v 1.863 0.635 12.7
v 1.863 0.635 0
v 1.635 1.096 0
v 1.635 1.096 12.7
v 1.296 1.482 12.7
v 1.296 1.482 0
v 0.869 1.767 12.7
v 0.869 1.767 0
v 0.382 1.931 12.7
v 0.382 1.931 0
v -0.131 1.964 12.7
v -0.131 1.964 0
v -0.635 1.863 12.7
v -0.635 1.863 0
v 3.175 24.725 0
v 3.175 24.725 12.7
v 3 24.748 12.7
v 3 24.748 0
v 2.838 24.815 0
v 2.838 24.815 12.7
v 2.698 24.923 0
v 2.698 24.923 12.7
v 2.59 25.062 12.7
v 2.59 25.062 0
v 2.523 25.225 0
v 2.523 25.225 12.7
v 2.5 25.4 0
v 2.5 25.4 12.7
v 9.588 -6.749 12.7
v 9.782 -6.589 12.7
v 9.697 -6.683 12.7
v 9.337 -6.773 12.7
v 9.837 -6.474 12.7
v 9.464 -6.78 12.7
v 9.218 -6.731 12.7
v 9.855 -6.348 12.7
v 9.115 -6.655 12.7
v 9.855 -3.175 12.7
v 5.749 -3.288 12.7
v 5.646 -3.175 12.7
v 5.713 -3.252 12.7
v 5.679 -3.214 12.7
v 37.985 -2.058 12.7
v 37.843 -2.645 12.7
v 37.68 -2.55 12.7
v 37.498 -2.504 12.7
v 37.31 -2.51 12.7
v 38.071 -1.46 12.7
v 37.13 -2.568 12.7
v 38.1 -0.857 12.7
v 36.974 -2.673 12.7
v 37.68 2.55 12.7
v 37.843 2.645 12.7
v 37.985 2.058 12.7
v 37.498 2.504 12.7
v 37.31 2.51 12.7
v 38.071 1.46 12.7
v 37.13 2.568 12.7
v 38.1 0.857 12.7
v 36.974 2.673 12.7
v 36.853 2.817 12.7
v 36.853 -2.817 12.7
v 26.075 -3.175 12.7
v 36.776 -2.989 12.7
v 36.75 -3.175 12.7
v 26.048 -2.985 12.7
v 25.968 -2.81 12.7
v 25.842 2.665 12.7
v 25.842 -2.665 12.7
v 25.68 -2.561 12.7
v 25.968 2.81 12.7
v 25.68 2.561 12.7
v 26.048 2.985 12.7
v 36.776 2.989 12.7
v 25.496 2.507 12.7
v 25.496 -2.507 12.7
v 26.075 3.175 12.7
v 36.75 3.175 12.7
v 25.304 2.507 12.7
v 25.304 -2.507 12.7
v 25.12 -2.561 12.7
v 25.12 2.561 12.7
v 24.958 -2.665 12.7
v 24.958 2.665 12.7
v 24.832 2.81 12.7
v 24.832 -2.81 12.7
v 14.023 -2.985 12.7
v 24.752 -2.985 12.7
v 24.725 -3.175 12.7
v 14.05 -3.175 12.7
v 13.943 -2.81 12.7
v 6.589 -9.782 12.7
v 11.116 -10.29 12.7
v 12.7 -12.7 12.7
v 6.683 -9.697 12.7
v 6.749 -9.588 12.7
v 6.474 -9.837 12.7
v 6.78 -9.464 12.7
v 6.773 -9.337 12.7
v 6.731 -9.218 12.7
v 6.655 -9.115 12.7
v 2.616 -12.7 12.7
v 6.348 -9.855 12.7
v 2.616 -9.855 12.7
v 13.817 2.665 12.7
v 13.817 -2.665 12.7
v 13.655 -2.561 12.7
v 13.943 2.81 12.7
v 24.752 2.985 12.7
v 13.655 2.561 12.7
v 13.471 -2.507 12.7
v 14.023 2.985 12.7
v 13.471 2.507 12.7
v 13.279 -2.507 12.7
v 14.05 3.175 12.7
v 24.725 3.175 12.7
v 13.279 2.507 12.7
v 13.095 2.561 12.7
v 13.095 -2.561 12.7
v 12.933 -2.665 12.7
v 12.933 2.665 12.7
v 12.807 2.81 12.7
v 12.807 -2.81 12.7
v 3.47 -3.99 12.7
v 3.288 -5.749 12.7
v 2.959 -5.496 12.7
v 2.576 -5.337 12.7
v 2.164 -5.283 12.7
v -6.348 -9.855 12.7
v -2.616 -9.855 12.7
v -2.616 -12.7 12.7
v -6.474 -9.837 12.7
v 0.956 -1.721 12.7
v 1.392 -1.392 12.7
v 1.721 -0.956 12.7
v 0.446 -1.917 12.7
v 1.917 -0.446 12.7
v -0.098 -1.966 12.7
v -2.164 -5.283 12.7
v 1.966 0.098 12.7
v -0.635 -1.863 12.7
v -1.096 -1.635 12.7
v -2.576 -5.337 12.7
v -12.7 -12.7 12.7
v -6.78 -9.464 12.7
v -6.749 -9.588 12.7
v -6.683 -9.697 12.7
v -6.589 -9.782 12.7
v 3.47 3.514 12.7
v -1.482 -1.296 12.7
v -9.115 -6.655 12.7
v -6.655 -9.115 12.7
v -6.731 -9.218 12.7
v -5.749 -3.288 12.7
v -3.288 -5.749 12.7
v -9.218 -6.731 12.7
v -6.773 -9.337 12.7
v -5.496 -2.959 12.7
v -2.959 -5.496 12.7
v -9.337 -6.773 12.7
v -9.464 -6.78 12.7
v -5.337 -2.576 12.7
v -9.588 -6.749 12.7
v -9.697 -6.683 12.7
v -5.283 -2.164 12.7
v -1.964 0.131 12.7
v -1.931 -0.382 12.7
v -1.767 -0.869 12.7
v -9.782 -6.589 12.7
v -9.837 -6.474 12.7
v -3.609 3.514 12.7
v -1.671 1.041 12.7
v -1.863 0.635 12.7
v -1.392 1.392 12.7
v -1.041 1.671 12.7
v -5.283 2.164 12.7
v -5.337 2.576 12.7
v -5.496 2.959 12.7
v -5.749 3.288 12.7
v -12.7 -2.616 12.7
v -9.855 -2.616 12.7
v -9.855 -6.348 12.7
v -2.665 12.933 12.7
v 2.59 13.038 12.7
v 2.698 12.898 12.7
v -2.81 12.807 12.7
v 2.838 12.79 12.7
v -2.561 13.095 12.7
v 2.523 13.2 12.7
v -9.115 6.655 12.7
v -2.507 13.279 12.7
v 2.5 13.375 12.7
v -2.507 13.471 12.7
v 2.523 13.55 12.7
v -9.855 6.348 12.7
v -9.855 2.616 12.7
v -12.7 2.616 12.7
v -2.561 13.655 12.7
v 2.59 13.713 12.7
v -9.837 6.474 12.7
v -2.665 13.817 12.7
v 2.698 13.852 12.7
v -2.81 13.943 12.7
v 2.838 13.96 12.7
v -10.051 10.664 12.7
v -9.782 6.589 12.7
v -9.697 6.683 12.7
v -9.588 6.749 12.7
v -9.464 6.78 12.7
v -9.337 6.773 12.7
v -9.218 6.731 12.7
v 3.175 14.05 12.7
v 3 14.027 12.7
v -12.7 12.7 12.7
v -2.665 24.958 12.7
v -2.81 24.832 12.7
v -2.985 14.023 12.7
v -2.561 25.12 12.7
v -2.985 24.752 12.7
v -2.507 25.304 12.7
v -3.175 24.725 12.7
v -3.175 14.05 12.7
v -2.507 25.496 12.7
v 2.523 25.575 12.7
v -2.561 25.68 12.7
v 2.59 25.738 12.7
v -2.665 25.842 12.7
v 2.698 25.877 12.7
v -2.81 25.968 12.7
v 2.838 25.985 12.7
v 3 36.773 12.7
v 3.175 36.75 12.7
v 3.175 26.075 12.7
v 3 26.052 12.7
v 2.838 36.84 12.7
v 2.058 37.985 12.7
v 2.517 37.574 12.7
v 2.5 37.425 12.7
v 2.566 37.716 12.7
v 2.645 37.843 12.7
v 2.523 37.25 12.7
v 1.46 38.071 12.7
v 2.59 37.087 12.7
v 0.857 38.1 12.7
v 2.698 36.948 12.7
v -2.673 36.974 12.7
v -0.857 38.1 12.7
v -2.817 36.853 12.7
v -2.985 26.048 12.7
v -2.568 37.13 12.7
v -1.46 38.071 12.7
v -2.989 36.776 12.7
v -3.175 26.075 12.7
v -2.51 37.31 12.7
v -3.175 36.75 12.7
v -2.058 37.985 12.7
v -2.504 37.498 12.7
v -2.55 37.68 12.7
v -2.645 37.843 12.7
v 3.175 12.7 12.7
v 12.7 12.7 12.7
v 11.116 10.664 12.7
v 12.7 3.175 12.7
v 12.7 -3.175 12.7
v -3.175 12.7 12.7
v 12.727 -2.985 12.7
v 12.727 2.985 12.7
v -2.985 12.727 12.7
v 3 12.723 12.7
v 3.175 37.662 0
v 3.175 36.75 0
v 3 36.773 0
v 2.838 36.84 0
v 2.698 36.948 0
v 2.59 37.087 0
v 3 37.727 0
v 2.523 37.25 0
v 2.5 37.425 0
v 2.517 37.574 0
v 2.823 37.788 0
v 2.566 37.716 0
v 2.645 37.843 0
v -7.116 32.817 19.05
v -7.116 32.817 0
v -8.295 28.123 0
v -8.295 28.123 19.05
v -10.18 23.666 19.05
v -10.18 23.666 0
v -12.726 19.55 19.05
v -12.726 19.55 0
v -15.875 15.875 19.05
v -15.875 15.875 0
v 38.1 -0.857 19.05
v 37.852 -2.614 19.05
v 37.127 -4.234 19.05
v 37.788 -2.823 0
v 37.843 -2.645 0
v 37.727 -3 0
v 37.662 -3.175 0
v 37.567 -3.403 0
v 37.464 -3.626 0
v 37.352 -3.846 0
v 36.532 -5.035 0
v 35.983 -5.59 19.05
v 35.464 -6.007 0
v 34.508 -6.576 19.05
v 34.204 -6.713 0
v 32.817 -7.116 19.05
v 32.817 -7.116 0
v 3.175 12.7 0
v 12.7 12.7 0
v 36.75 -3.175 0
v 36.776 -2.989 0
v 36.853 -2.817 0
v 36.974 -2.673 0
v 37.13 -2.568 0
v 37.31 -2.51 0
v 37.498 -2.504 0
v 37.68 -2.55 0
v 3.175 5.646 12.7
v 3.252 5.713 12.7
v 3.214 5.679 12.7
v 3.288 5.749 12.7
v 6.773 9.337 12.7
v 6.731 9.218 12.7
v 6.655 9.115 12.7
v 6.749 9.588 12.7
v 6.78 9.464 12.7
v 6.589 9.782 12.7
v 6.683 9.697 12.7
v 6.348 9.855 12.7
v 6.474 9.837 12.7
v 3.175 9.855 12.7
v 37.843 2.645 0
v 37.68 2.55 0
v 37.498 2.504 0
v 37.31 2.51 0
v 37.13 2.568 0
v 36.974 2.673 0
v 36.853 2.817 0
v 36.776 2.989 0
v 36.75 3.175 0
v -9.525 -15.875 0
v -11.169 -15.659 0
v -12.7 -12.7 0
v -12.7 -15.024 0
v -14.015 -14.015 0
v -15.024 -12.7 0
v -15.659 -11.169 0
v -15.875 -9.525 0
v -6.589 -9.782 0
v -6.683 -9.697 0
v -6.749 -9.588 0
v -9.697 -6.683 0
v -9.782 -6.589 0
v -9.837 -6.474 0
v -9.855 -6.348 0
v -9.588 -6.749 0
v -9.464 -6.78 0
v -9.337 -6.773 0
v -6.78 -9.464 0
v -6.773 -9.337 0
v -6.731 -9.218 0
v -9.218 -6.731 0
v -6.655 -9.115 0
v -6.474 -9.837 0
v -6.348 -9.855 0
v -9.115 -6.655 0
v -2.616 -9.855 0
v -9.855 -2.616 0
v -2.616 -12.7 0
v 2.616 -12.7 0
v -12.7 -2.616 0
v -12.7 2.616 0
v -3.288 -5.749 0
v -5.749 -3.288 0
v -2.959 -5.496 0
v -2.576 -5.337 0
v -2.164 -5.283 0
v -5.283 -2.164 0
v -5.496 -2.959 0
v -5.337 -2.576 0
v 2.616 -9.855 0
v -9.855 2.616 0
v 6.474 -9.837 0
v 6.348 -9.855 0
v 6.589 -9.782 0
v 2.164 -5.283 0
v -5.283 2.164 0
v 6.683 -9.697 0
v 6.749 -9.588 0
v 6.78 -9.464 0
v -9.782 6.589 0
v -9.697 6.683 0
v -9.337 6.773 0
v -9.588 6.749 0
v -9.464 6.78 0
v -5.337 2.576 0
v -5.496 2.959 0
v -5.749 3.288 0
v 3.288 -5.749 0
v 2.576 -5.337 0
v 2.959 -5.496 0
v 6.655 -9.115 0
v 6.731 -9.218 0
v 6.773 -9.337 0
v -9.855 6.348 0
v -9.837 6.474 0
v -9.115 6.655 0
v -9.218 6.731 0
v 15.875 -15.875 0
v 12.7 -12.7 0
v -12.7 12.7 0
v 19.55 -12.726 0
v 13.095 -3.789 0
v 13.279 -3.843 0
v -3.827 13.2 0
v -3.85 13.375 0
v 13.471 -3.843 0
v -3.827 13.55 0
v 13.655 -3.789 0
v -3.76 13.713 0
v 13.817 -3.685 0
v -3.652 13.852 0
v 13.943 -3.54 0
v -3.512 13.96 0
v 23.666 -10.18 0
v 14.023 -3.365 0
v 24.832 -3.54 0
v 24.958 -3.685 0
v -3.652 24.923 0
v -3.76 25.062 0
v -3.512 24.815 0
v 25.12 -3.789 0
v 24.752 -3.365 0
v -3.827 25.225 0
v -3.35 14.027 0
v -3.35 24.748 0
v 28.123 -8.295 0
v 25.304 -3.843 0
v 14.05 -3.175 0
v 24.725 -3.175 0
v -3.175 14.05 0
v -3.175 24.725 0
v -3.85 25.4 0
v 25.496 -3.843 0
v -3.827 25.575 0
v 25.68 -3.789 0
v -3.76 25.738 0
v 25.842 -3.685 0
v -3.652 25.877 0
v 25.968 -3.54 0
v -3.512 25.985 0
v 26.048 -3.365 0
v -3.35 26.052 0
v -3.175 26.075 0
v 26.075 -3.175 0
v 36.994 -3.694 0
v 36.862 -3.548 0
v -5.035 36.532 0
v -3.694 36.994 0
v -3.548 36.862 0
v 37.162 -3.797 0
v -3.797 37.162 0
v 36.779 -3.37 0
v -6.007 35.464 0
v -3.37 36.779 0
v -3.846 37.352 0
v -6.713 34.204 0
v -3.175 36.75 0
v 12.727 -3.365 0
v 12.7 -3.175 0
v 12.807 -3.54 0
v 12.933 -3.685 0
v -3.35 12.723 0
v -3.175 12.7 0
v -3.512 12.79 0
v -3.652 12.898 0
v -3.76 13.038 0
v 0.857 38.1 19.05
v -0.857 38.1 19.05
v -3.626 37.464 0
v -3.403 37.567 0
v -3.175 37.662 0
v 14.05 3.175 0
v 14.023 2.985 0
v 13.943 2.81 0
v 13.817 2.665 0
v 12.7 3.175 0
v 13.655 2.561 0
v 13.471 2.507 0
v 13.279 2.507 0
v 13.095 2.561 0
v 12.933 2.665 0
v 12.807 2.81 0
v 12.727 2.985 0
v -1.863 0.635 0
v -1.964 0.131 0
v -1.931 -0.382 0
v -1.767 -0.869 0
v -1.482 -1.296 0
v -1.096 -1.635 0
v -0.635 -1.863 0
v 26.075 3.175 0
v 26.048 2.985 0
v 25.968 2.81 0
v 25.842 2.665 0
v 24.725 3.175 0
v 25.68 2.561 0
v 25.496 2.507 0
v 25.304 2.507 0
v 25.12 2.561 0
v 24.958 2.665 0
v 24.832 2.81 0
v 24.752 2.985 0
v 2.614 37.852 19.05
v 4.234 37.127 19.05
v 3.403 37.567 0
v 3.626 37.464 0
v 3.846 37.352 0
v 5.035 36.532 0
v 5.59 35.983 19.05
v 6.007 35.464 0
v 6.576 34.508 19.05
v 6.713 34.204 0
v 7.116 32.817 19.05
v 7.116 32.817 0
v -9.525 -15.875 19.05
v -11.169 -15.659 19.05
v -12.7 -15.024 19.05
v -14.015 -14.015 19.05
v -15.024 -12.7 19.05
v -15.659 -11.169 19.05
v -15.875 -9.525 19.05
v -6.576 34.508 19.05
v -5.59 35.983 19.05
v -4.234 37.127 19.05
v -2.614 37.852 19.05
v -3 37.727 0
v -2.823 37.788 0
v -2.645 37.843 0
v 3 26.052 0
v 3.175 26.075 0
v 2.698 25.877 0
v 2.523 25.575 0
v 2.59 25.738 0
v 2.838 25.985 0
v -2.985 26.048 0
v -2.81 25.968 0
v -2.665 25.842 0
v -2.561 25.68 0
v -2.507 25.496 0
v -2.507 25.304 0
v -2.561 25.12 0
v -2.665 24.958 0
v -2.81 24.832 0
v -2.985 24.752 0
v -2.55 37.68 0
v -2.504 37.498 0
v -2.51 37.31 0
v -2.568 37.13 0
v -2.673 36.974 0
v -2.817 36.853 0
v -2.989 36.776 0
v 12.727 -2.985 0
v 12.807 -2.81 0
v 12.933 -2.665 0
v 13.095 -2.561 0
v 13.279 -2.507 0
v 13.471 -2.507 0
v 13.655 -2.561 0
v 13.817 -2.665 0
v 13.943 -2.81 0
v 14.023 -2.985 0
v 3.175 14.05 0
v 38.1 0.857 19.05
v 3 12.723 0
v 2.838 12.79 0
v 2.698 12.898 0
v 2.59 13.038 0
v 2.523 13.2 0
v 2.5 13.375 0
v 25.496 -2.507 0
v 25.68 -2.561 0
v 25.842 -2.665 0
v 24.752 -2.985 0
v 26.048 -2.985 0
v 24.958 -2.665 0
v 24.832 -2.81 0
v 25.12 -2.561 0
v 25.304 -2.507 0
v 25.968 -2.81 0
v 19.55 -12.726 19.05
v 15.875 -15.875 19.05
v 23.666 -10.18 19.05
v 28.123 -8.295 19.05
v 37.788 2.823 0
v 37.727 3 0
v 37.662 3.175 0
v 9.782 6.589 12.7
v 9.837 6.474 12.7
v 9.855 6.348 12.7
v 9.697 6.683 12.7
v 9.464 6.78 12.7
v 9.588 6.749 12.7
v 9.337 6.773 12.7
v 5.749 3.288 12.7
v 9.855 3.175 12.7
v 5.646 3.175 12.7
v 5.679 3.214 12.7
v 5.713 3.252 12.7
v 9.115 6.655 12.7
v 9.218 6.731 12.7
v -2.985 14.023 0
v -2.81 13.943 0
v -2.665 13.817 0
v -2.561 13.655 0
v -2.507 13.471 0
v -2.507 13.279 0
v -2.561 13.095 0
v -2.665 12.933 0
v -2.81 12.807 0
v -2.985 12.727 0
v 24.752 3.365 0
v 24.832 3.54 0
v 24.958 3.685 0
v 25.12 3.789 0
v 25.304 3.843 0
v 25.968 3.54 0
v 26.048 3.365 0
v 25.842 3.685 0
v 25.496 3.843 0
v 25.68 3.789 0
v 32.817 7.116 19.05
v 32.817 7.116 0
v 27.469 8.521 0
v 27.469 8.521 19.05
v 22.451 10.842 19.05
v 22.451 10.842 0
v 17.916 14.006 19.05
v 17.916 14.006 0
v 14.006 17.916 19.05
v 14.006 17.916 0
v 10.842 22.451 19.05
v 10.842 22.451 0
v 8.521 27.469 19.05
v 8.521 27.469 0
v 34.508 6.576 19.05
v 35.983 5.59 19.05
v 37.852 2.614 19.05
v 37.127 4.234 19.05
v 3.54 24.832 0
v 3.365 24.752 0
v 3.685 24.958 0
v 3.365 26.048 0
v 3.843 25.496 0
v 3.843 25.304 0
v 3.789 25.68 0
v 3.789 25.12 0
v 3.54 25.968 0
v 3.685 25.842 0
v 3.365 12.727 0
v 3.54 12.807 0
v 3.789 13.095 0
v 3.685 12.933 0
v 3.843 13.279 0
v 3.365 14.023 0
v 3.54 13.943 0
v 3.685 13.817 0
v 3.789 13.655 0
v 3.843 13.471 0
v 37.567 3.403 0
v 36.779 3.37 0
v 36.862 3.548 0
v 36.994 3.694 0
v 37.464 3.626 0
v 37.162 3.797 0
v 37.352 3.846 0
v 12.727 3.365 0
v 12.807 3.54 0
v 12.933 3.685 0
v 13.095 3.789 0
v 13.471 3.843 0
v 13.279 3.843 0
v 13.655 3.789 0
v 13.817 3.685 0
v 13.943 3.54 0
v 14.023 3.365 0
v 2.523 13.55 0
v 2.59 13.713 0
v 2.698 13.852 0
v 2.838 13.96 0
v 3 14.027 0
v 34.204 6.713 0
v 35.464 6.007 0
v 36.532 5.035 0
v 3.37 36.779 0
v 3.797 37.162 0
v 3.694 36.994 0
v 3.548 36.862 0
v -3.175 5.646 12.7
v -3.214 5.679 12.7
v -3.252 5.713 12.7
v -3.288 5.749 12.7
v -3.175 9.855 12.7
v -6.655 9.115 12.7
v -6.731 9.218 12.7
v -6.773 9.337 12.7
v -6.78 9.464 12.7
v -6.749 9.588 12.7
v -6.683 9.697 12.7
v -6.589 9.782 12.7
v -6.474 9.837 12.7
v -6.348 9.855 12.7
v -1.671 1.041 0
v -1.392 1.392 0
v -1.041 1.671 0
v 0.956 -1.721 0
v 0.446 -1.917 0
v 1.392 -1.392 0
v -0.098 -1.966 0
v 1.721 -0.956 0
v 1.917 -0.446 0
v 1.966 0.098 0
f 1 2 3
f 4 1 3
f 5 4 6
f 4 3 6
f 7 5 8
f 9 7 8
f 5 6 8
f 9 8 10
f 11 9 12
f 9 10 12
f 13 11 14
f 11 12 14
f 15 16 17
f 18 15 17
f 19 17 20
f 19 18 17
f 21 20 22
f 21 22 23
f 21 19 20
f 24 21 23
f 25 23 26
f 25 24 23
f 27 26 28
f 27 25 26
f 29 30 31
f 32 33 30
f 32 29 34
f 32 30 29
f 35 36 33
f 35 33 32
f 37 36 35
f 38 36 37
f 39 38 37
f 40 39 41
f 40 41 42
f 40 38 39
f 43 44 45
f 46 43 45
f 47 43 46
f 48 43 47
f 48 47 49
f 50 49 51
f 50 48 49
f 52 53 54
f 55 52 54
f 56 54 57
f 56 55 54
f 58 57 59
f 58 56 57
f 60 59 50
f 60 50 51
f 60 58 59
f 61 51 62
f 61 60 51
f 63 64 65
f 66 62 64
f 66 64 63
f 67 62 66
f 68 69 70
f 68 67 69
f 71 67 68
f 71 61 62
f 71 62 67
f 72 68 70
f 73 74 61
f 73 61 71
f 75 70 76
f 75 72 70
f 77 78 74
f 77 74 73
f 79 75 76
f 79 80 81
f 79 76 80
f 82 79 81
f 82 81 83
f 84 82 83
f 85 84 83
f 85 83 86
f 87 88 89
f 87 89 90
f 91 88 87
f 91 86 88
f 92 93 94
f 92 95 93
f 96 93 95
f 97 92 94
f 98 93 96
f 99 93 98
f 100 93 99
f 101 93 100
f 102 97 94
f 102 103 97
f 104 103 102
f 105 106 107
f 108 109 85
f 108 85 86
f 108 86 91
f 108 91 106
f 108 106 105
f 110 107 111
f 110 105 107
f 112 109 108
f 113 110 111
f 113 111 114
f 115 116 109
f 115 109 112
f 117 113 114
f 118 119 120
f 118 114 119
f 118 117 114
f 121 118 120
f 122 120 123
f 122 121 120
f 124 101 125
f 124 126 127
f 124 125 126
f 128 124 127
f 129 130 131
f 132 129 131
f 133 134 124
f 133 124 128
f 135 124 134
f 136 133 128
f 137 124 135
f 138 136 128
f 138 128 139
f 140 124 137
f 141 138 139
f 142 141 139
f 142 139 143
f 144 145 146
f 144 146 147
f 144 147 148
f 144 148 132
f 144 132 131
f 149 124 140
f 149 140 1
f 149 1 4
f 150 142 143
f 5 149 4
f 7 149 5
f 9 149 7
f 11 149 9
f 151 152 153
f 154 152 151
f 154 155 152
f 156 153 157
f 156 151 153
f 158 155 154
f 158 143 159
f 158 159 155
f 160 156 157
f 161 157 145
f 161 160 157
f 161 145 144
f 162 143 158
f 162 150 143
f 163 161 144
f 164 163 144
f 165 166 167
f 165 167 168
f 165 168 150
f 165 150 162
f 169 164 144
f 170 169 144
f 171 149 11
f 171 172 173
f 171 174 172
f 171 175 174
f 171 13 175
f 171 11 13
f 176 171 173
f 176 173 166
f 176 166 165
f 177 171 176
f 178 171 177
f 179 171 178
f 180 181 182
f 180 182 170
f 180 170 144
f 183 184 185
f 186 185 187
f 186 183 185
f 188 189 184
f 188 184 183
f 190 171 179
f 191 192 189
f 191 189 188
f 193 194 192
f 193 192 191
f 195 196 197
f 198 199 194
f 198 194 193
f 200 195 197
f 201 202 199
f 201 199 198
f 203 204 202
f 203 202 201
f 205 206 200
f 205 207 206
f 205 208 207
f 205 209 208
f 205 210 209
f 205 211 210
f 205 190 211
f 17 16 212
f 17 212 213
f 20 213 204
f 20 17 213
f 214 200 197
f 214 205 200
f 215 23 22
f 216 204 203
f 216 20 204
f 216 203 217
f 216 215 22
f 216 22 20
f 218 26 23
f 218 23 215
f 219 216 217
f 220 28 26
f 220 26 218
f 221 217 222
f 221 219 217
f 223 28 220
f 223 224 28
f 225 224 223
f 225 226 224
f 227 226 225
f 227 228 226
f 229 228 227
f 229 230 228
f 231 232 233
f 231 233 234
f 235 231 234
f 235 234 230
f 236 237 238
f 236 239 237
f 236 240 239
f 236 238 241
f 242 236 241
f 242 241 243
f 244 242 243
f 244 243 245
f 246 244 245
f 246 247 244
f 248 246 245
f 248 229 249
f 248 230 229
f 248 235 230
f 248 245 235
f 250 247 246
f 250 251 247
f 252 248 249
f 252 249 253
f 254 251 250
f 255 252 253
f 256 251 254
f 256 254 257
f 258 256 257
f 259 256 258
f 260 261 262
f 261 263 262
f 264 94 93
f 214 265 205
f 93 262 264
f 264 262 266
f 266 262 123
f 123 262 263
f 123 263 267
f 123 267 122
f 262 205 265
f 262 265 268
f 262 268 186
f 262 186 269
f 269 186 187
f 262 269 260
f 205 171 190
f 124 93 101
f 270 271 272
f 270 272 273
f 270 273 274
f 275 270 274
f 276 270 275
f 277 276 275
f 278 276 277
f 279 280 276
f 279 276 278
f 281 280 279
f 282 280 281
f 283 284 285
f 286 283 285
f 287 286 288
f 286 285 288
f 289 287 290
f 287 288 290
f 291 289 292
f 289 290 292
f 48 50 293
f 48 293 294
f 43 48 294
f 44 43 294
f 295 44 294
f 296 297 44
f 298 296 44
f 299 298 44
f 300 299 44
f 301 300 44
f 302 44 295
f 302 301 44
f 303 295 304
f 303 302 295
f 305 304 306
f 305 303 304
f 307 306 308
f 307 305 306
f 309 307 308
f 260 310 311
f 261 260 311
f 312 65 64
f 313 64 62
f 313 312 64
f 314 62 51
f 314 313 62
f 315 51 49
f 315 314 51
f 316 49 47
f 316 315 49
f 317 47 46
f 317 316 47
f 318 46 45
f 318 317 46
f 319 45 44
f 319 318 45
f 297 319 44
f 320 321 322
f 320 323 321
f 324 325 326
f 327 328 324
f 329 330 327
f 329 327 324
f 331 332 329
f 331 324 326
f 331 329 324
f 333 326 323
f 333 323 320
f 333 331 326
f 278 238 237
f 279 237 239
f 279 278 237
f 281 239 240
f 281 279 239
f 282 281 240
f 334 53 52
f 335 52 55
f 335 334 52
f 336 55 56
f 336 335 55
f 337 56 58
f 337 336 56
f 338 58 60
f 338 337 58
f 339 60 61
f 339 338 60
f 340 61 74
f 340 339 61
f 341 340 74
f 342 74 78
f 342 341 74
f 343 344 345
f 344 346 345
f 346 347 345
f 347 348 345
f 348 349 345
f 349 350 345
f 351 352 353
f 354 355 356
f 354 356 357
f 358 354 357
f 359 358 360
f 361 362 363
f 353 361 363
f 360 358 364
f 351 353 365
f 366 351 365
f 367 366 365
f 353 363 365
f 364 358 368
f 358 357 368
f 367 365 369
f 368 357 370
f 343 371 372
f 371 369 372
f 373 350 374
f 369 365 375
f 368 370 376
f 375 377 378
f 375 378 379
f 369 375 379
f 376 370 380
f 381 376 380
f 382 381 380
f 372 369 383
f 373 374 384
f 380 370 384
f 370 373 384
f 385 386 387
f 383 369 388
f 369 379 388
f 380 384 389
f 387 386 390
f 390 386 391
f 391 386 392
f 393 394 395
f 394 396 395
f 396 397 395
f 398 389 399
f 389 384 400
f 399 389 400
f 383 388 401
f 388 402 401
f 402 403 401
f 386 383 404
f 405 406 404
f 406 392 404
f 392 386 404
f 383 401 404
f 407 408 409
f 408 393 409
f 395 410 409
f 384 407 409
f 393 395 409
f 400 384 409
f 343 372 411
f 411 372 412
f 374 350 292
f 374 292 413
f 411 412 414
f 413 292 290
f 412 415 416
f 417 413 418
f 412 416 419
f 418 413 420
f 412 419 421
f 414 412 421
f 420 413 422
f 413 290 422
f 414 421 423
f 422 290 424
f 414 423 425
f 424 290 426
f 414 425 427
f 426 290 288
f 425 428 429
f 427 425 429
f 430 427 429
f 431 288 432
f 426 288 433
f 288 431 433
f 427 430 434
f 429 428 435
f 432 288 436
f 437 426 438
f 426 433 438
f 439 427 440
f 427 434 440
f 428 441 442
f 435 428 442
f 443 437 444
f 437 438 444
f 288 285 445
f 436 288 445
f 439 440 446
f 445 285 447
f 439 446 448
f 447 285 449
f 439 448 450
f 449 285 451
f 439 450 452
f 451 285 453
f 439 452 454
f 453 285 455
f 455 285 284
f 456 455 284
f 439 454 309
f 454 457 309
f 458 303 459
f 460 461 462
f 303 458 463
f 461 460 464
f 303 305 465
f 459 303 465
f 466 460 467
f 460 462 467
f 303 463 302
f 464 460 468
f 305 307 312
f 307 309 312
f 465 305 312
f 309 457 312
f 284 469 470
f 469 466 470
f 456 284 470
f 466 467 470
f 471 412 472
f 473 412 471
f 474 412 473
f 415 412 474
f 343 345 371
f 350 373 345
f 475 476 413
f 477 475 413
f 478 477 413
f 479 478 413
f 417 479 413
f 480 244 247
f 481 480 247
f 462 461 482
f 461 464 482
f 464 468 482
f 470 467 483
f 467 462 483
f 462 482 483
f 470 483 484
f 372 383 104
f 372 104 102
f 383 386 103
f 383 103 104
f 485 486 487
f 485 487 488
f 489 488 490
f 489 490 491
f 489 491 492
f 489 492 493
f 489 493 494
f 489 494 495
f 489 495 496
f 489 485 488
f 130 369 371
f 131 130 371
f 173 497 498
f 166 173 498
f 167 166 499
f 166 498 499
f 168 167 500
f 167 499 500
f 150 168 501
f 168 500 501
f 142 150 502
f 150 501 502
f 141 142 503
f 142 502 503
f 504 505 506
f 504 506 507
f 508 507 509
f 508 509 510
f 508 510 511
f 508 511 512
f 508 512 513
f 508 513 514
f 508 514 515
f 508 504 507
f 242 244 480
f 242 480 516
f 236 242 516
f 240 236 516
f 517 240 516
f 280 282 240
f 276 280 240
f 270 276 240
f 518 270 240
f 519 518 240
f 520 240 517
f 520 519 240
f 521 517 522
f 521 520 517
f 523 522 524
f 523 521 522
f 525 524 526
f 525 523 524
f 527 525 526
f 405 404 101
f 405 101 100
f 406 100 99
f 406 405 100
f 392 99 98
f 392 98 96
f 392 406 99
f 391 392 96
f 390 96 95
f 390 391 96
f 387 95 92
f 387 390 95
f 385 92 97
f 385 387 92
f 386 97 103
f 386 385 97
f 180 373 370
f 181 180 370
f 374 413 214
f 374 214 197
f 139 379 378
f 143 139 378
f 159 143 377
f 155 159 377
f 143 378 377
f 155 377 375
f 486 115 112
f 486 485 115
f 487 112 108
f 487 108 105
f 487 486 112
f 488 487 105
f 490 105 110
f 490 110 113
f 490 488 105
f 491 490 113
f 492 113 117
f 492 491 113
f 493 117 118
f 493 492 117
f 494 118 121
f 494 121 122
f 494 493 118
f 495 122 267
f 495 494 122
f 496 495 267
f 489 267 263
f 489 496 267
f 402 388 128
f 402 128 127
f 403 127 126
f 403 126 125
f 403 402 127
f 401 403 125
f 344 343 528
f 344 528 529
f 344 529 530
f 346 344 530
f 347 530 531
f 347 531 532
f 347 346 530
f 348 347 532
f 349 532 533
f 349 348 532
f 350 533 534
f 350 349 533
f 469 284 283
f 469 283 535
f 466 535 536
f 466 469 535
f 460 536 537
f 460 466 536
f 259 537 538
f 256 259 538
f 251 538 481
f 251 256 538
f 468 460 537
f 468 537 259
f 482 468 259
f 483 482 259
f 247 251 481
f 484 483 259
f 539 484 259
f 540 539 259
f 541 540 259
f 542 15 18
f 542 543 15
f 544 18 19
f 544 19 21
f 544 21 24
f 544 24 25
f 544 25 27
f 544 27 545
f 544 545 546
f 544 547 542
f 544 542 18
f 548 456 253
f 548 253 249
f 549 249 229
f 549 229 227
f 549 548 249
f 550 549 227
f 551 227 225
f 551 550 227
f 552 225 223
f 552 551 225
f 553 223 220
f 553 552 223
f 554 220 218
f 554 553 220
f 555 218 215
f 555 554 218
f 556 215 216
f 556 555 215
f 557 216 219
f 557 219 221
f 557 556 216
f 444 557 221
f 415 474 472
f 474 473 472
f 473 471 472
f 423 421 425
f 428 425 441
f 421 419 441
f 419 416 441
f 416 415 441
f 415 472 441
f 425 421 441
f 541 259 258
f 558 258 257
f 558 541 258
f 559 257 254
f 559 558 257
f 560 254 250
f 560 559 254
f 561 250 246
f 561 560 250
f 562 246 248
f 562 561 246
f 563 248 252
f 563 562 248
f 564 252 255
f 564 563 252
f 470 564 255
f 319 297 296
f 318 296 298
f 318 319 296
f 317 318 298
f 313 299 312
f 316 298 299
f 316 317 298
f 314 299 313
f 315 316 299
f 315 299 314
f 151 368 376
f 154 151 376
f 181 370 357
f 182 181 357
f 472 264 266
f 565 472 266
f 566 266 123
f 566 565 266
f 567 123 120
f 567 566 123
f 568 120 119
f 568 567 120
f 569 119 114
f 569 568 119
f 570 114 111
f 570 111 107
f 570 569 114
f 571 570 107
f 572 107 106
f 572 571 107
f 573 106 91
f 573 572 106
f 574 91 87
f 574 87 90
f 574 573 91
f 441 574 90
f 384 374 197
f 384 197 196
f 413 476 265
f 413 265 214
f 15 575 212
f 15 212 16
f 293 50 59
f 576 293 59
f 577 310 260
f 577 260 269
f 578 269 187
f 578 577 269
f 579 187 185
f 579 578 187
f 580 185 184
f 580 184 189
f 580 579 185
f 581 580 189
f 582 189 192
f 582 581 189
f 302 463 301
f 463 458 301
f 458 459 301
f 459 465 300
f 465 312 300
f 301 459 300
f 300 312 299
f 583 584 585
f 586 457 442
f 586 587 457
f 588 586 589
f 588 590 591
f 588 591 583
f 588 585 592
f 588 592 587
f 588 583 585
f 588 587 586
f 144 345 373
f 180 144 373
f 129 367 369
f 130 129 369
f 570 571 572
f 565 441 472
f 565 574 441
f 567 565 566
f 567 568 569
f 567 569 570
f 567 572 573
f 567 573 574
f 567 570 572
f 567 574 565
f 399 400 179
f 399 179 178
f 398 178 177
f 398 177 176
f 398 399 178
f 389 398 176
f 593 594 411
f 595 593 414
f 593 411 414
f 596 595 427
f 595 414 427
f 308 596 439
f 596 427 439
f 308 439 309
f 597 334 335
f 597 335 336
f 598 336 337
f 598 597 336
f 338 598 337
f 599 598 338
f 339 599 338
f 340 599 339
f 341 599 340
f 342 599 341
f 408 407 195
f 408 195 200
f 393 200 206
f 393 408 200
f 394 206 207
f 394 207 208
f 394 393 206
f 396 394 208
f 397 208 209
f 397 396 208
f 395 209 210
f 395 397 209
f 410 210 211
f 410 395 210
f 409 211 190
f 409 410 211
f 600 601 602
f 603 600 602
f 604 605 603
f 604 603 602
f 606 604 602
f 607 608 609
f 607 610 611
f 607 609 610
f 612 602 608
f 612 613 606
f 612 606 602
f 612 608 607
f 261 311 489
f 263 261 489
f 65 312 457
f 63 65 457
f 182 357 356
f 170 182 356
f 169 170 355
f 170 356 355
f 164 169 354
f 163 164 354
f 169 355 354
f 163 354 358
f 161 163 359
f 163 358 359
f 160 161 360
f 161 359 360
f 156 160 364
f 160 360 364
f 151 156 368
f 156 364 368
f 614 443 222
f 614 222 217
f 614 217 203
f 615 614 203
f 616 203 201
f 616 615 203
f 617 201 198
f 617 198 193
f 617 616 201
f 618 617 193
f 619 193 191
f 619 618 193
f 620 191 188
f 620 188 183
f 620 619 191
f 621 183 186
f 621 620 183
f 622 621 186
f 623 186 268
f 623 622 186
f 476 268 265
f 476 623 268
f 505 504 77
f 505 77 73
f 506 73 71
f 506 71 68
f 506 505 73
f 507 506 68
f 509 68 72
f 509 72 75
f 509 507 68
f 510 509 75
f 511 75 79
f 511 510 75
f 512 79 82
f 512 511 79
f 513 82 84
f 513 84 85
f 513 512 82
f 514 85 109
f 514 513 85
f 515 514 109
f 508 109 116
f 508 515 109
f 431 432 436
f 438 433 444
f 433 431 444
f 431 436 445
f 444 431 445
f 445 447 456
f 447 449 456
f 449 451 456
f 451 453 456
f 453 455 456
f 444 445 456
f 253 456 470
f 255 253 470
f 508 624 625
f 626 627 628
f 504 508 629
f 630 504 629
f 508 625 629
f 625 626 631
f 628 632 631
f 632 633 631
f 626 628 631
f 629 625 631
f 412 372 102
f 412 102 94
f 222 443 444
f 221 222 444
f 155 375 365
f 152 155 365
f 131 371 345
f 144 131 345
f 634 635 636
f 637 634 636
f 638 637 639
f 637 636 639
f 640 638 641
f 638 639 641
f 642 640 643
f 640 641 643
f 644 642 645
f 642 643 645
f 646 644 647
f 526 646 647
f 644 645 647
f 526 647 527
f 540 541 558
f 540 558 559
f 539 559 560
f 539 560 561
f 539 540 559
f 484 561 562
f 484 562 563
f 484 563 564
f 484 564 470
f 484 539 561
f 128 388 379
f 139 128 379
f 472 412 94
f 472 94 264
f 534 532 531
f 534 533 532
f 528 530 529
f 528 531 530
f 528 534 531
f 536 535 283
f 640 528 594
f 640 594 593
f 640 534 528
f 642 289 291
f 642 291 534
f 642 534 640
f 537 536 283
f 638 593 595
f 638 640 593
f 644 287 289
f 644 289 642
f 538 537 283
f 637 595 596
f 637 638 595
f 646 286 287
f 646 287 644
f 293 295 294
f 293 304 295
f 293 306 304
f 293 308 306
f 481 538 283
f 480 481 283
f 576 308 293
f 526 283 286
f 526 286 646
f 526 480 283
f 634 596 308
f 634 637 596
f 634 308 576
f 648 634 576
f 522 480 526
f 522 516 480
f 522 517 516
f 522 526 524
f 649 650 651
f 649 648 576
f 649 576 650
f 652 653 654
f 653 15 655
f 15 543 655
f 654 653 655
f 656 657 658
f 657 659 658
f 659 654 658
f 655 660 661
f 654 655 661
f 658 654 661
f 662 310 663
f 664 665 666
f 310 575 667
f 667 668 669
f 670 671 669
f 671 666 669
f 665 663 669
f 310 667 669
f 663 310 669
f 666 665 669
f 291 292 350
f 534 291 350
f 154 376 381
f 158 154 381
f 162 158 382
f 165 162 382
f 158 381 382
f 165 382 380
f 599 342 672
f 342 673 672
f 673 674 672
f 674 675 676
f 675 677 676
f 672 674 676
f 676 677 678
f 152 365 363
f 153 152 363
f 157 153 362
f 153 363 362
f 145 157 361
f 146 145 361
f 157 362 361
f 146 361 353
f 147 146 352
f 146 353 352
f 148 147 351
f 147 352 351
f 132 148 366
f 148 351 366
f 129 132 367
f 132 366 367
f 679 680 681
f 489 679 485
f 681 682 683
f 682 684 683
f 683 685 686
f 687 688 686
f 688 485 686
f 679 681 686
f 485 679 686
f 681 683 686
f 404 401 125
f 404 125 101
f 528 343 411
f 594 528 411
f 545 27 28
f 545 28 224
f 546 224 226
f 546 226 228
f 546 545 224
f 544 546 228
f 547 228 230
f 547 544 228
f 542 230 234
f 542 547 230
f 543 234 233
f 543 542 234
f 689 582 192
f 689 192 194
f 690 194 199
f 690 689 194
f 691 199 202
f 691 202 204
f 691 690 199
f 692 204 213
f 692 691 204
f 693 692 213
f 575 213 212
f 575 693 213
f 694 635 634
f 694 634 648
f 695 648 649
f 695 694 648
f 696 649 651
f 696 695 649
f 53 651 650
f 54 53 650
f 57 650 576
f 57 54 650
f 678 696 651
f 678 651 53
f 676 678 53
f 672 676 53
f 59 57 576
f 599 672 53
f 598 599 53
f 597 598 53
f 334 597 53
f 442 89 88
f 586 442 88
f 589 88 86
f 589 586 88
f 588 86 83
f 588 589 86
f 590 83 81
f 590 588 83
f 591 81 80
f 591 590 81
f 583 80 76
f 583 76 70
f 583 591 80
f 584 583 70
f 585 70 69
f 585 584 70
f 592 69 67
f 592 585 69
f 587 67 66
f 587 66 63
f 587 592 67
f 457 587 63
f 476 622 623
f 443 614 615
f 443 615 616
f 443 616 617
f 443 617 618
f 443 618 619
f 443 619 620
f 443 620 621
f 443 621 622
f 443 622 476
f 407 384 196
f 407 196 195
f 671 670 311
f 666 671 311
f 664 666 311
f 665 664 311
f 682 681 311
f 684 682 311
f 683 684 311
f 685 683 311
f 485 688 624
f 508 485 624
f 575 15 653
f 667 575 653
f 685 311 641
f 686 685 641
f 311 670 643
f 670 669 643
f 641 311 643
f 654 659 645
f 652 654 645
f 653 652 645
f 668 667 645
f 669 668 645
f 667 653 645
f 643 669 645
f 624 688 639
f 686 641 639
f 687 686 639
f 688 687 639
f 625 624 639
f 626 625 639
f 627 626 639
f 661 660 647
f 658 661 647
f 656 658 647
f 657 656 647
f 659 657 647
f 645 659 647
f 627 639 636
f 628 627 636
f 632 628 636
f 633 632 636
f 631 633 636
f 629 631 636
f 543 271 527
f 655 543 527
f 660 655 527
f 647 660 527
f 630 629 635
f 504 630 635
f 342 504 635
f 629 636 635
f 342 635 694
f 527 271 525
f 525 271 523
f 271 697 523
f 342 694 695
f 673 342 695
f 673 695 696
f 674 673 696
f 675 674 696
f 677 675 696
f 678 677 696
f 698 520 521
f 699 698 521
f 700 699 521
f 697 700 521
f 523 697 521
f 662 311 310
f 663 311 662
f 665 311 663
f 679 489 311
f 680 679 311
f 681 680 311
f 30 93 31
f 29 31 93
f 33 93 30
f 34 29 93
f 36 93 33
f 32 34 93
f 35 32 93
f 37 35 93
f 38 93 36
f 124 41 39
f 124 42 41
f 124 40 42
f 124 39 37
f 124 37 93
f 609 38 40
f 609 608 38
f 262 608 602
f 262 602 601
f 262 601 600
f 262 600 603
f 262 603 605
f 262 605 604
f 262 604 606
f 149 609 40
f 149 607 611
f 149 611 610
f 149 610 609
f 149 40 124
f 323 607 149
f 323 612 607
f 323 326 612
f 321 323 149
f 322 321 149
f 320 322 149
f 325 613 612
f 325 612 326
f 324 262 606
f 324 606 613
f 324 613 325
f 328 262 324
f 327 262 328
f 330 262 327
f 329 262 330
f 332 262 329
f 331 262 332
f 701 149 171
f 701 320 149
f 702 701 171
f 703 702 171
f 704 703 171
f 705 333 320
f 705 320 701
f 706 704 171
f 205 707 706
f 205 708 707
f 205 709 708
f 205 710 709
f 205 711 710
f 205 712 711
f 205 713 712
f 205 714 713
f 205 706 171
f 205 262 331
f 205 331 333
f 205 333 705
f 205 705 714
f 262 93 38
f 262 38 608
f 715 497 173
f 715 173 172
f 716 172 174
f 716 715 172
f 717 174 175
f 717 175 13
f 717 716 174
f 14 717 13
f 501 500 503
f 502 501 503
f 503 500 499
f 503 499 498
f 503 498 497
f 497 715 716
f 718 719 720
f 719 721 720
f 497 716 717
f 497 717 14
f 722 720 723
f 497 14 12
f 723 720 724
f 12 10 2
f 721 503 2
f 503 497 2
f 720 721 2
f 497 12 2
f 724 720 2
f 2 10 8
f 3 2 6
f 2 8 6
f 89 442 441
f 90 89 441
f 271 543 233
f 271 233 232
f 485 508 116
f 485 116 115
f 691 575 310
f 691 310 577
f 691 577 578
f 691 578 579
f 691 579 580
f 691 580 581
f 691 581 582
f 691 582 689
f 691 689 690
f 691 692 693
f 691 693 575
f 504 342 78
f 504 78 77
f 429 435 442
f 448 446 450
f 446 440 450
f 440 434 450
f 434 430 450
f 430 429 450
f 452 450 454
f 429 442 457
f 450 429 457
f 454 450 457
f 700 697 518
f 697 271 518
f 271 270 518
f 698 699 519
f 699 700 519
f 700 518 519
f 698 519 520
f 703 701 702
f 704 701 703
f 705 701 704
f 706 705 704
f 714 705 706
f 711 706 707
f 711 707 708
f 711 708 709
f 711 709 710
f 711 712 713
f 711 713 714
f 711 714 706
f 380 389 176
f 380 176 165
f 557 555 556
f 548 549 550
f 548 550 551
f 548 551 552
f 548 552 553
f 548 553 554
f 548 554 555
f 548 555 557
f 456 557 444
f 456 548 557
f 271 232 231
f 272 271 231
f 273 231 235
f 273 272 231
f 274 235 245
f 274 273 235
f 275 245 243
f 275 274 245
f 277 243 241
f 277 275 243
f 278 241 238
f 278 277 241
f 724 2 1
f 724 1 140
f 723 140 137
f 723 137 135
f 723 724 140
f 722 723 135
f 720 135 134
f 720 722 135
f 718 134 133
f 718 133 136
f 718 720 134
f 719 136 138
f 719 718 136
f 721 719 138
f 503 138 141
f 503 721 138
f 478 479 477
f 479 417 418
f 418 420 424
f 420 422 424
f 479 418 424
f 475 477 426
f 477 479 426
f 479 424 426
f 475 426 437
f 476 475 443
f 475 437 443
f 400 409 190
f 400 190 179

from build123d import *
from build123d.topology import SkipClean

# Parameters (mm, degrees)
BOSS_EXTRUDE1_DEPTH  = 19.05
CUT_EXTRUDE1_DEPTH   = 12.7
MIRROR2_COPY_1_DEPTH = 12.7
SKETCH6_W            = 6.35
SKETCH6_H            = 32.8168
SKETCH6_W_2          = 32.8168
SKETCH6_H_2          = 6.35
CUT_EXTRUDE2_DEPTH   = 12.7
SKETCH7_R            = 0.675
BOSS_EXTRUDE2_DEPTH  = 12.7
FILLET2_DEPTH        = 20
CUT_EXTRUDE3_DEPTH   = 12.7


with BuildPart() as part:
    # Sketch5 → Boss-Extrude1 (new body)
    with BuildSketch(Plane.XY):
        with BuildLine():
            Line((-15.875, 15.875), (-15.875, -15.875))
            Line((-15.875, -15.875), (15.875, -15.875))
            ThreePointArc((15.875, -15.875), (26.071916674, -9.061638106), (38.1, -6.669103576))
            Line((38.1, -6.669103576), (38.1, 6.669103576))
            ThreePointArc((38.1, 6.669103576), (15.875, 15.875), (6.669103576, 38.1))
            Line((6.669103576, 38.1), (-6.669103576, 38.1))
            ThreePointArc((-6.669103576, 38.1), (-9.061638106, 26.071916674), (-15.875, 15.875))
        make_face()
    extrude(amount=BOSS_EXTRUDE1_DEPTH)

    # Sketch4 → Cut-Extrude1 (cut)
    with BuildSketch(Plane.XY):
        with BuildLine():
            Line((4.190365, -12.7), (10.11729625, -12.7))
            Line((10.11729625, -12.7), (12.7, -12.7))
            Line((12.7, -12.7), (12.7, -10.11729625))
            Line((12.7, -10.11729625), (12.7, -4.190365))
            Line((12.7, -4.190365), (12.7, -2.6162))
            Line((12.7, -2.6162), (11.760835, -2.6162))
            Line((11.760835, -2.6162), (11.429365, -2.6162))
            Line((11.429365, -2.6162), (9.8552, -2.6162))
            Line((9.8552, -2.6162), (9.8552, -4.190365))
            Line((9.8552, -4.190365), (9.8552, -6.348478019))
            ThreePointArc((9.8552, -6.348478019), (9.587703162, -6.748815328), (9.115473107, -6.65488293))
            Line((9.115473107, -6.65488293), (5.748911934, -3.288321756))
            ThreePointArc((5.748911934, -3.288321756), (5.404234588, -2.772475655), (5.2832, -2.16399369))
            Line((5.2832, -2.16399369), (5.2832, 0.635))
            Line((5.2832, 0.635), (1.863267895, 0.635))
            ThreePointArc((1.863267895, 0.635), (1.391939699, -1.391939699), (-0.635, -1.863267895))
            Line((-0.635, -1.863267895), (-0.635, -5.2832))
            Line((-0.635, -5.2832), (2.16399369, -5.2832))
            ThreePointArc((2.16399369, -5.2832), (2.772475655, -5.404234588), (3.288321756, -5.748911934))
            Line((3.288321756, -5.748911934), (6.65488293, -9.115473107))
            ThreePointArc((6.65488293, -9.115473107), (6.748815328, -9.587703162), (6.348478019, -9.8552))
            Line((6.348478019, -9.8552), (4.190365, -9.8552))
            Line((4.190365, -9.8552), (2.6162, -9.8552))
            Line((2.6162, -9.8552), (2.6162, -11.429365))
            Line((2.6162, -11.429365), (2.6162, -11.760835))
            Line((2.6162, -11.760835), (2.6162, -12.7))
            Line((2.6162, -12.7), (4.190365, -12.7))
        make_face()
    cut_extrude1 = extrude(amount=CUT_EXTRUDE1_DEPTH, mode=Mode.SUBTRACT)

    # Mirror1: Cut-Extrude1 across plane
    add(cut_extrude1.mirror(Plane.ZX), mode=Mode.SUBTRACT)

    # Mirror2: Cut-Extrude1 across plane
    add(cut_extrude1.mirror(Plane(origin=(0, 0, 0), x_dir=(0, 0, 1), z_dir=(1, 0, 0))), mode=Mode.SUBTRACT)

    # Mirror2 copy 1 sketch → Mirror2 copy 1 (cut)
    with BuildSketch(Plane(origin=(0, 0, 0), x_dir=(-1, 0, 0), z_dir=(0, 0, 1))):
        with BuildLine():
            Line((4.190365, -12.7), (10.11729625, -12.7))
            Line((10.11729625, -12.7), (12.7, -12.7))
            Line((12.7, -12.7), (12.7, -10.11729625))
            Line((12.7, -10.11729625), (12.7, -4.190365))
            Line((12.7, -4.190365), (12.7, -2.6162))
            Line((12.7, -2.6162), (11.760835, -2.6162))
            Line((11.760835, -2.6162), (11.429365, -2.6162))
            Line((11.429365, -2.6162), (9.8552, -2.6162))
            Line((9.8552, -2.6162), (9.8552, -4.190365))
            Line((9.8552, -4.190365), (9.8552, -6.348478019))
            ThreePointArc((9.8552, -6.348478019), (9.587703162, -6.748815328), (9.115473107, -6.65488293))
            Line((9.115473107, -6.65488293), (5.748911934, -3.288321756))
            ThreePointArc((5.748911934, -3.288321756), (5.404234588, -2.772475655), (5.2832, -2.16399369))
            Line((5.2832, -2.16399369), (5.2832, 0.635))
            Line((5.2832, 0.635), (1.863267895, 0.635))
            ThreePointArc((1.863267895, 0.635), (1.391939699, -1.391939699), (-0.635, -1.863267895))
            Line((-0.635, -1.863267895), (-0.635, -5.2832))
            Line((-0.635, -5.2832), (2.16399369, -5.2832))
            ThreePointArc((2.16399369, -5.2832), (2.772475655, -5.404234588), (3.288321756, -5.748911934))
            Line((3.288321756, -5.748911934), (6.65488293, -9.115473107))
            ThreePointArc((6.65488293, -9.115473107), (6.748815328, -9.587703162), (6.348478019, -9.8552))
            Line((6.348478019, -9.8552), (4.190365, -9.8552))
            Line((4.190365, -9.8552), (2.6162, -9.8552))
            Line((2.6162, -9.8552), (2.6162, -11.429365))
            Line((2.6162, -11.429365), (2.6162, -11.760835))
            Line((2.6162, -11.760835), (2.6162, -12.7))
            Line((2.6162, -12.7), (4.190365, -12.7))
        make_face()
    extrude(amount=MIRROR2_COPY_1_DEPTH, mode=Mode.SUBTRACT)

    # Sketch6 → Cut-Extrude2 (cut)
    with BuildSketch(Plane(origin=(0, 0, 0), x_dir=(-1, 0, 0), z_dir=(0, 0, -1))):
        with Locations((0, 21.6916)):
            Rectangle(SKETCH6_W, SKETCH6_H)
        with Locations((-21.6916, 0)):
            Rectangle(SKETCH6_W_2, SKETCH6_H_2)
    extrude(amount=-CUT_EXTRUDE2_DEPTH, mode=Mode.SUBTRACT)

    # Sketch7 → Boss-Extrude2 (add)
    with SkipClean():  # the faces are left unmerged after this step: merging them gives an invalid solid
        with BuildSketch(Plane(origin=(0, 0, 0), x_dir=(-1, 0, 0), z_dir=(0, 0, -1))):
            with Locations((-37.425, 3.175)):
                Circle(SKETCH7_R)
            with Locations((-13.375, 3.175)):
                Circle(SKETCH7_R)
            with Locations((-13.375, -3.175)):
                Circle(SKETCH7_R)
            with Locations((-37.425, -3.175)):
                Circle(SKETCH7_R)
            with Locations((-3.175, 13.375)):
                Circle(SKETCH7_R)
            with Locations((3.175, 13.375)):
                Circle(SKETCH7_R)
            with Locations((-3.175, 37.425)):
                Circle(SKETCH7_R)
            with Locations((3.175, 37.425)):
                Circle(SKETCH7_R)
            with Locations((-25.4, 3.175)):
                Circle(SKETCH7_R)
            with Locations((-25.4, -3.175)):
                Circle(SKETCH7_R)
            with Locations((-3.175, 25.4)):
                Circle(SKETCH7_R)
            with Locations((3.175, 25.4)):
                Circle(SKETCH7_R)
        extrude(amount=-BOSS_EXTRUDE2_DEPTH)

    # Fillet2: read off the stored shape, not the designer's step
    # Fillet2 outline → Fillet2 (cut)
    with SkipClean():  # the faces are left unmerged after this step: merging them gives an invalid solid
        with BuildSketch(Plane.XY):
            with BuildLine():
                Line((-15.875, -15.875), (-9.525, -15.875))
                ThreePointArc((-9.525, -15.875), (-14.015128061, -14.015128061), (-15.875, -9.525))
                Line((-15.875, -9.525), (-15.875, -15.875))
            make_face()
            with BuildLine():
                ThreePointArc((32.817272188, -7.11622946), (35.449191883, -6.781084528), (38.1, -6.669103576))
                Line((38.1, -6.669103576), (38.1, -0.85656253))
                ThreePointArc((38.1, -0.85656253), (36.602817656, -4.952006438), (32.817272188, -7.11622946))
            make_face()
            with BuildLine():
                ThreePointArc((-6.669103576, 38.1), (-6.781084528, 35.449191883), (-7.11622946, 32.817272188))
                ThreePointArc((-7.11622946, 32.817272188), (-4.952006438, 36.602817656), (-0.85656253, 38.1))
                Line((-0.85656253, 38.1), (-6.669103576, 38.1))
            make_face()
            with BuildLine():
                Line((38.1, 0.85656253), (38.1, 6.669103576))
                ThreePointArc((38.1, 6.669103576), (35.449191883, 6.781084528), (32.817272188, 7.11622946))
                ThreePointArc((32.817272188, 7.11622946), (36.602817656, 4.952006438), (38.1, 0.85656253))
            make_face()
            with BuildLine():
                ThreePointArc((0.85656253, 38.1), (4.952006438, 36.602817656), (7.11622946, 32.817272188))
                ThreePointArc((7.11622946, 32.817272188), (6.781084528, 35.449191883), (6.669103576, 38.1))
                Line((6.669103576, 38.1), (0.85656253, 38.1))
            make_face()
        extrude(amount=FILLET2_DEPTH, mode=Mode.SUBTRACT)

    # Sketch8 → Cut-Extrude3 (cut)
    with SkipClean():  # the faces are left unmerged after this step: merging them gives an invalid solid
        with BuildSketch(Plane(origin=(0, 0, 0), x_dir=(-1, 0, 0), z_dir=(0, 0, -1))):
            Polygon((-11.115734746, 10.664446616), (-11.115734746, -10.290263943), (-3.470097109, -3.989692187), (-3.470097109, 3.514359567), (3.609196999, 3.514359567), (10.051354637, 10.664446616), align=None)
        extrude(amount=-CUT_EXTRUDE3_DEPTH, mode=Mode.SUBTRACT)


solid = part.part
